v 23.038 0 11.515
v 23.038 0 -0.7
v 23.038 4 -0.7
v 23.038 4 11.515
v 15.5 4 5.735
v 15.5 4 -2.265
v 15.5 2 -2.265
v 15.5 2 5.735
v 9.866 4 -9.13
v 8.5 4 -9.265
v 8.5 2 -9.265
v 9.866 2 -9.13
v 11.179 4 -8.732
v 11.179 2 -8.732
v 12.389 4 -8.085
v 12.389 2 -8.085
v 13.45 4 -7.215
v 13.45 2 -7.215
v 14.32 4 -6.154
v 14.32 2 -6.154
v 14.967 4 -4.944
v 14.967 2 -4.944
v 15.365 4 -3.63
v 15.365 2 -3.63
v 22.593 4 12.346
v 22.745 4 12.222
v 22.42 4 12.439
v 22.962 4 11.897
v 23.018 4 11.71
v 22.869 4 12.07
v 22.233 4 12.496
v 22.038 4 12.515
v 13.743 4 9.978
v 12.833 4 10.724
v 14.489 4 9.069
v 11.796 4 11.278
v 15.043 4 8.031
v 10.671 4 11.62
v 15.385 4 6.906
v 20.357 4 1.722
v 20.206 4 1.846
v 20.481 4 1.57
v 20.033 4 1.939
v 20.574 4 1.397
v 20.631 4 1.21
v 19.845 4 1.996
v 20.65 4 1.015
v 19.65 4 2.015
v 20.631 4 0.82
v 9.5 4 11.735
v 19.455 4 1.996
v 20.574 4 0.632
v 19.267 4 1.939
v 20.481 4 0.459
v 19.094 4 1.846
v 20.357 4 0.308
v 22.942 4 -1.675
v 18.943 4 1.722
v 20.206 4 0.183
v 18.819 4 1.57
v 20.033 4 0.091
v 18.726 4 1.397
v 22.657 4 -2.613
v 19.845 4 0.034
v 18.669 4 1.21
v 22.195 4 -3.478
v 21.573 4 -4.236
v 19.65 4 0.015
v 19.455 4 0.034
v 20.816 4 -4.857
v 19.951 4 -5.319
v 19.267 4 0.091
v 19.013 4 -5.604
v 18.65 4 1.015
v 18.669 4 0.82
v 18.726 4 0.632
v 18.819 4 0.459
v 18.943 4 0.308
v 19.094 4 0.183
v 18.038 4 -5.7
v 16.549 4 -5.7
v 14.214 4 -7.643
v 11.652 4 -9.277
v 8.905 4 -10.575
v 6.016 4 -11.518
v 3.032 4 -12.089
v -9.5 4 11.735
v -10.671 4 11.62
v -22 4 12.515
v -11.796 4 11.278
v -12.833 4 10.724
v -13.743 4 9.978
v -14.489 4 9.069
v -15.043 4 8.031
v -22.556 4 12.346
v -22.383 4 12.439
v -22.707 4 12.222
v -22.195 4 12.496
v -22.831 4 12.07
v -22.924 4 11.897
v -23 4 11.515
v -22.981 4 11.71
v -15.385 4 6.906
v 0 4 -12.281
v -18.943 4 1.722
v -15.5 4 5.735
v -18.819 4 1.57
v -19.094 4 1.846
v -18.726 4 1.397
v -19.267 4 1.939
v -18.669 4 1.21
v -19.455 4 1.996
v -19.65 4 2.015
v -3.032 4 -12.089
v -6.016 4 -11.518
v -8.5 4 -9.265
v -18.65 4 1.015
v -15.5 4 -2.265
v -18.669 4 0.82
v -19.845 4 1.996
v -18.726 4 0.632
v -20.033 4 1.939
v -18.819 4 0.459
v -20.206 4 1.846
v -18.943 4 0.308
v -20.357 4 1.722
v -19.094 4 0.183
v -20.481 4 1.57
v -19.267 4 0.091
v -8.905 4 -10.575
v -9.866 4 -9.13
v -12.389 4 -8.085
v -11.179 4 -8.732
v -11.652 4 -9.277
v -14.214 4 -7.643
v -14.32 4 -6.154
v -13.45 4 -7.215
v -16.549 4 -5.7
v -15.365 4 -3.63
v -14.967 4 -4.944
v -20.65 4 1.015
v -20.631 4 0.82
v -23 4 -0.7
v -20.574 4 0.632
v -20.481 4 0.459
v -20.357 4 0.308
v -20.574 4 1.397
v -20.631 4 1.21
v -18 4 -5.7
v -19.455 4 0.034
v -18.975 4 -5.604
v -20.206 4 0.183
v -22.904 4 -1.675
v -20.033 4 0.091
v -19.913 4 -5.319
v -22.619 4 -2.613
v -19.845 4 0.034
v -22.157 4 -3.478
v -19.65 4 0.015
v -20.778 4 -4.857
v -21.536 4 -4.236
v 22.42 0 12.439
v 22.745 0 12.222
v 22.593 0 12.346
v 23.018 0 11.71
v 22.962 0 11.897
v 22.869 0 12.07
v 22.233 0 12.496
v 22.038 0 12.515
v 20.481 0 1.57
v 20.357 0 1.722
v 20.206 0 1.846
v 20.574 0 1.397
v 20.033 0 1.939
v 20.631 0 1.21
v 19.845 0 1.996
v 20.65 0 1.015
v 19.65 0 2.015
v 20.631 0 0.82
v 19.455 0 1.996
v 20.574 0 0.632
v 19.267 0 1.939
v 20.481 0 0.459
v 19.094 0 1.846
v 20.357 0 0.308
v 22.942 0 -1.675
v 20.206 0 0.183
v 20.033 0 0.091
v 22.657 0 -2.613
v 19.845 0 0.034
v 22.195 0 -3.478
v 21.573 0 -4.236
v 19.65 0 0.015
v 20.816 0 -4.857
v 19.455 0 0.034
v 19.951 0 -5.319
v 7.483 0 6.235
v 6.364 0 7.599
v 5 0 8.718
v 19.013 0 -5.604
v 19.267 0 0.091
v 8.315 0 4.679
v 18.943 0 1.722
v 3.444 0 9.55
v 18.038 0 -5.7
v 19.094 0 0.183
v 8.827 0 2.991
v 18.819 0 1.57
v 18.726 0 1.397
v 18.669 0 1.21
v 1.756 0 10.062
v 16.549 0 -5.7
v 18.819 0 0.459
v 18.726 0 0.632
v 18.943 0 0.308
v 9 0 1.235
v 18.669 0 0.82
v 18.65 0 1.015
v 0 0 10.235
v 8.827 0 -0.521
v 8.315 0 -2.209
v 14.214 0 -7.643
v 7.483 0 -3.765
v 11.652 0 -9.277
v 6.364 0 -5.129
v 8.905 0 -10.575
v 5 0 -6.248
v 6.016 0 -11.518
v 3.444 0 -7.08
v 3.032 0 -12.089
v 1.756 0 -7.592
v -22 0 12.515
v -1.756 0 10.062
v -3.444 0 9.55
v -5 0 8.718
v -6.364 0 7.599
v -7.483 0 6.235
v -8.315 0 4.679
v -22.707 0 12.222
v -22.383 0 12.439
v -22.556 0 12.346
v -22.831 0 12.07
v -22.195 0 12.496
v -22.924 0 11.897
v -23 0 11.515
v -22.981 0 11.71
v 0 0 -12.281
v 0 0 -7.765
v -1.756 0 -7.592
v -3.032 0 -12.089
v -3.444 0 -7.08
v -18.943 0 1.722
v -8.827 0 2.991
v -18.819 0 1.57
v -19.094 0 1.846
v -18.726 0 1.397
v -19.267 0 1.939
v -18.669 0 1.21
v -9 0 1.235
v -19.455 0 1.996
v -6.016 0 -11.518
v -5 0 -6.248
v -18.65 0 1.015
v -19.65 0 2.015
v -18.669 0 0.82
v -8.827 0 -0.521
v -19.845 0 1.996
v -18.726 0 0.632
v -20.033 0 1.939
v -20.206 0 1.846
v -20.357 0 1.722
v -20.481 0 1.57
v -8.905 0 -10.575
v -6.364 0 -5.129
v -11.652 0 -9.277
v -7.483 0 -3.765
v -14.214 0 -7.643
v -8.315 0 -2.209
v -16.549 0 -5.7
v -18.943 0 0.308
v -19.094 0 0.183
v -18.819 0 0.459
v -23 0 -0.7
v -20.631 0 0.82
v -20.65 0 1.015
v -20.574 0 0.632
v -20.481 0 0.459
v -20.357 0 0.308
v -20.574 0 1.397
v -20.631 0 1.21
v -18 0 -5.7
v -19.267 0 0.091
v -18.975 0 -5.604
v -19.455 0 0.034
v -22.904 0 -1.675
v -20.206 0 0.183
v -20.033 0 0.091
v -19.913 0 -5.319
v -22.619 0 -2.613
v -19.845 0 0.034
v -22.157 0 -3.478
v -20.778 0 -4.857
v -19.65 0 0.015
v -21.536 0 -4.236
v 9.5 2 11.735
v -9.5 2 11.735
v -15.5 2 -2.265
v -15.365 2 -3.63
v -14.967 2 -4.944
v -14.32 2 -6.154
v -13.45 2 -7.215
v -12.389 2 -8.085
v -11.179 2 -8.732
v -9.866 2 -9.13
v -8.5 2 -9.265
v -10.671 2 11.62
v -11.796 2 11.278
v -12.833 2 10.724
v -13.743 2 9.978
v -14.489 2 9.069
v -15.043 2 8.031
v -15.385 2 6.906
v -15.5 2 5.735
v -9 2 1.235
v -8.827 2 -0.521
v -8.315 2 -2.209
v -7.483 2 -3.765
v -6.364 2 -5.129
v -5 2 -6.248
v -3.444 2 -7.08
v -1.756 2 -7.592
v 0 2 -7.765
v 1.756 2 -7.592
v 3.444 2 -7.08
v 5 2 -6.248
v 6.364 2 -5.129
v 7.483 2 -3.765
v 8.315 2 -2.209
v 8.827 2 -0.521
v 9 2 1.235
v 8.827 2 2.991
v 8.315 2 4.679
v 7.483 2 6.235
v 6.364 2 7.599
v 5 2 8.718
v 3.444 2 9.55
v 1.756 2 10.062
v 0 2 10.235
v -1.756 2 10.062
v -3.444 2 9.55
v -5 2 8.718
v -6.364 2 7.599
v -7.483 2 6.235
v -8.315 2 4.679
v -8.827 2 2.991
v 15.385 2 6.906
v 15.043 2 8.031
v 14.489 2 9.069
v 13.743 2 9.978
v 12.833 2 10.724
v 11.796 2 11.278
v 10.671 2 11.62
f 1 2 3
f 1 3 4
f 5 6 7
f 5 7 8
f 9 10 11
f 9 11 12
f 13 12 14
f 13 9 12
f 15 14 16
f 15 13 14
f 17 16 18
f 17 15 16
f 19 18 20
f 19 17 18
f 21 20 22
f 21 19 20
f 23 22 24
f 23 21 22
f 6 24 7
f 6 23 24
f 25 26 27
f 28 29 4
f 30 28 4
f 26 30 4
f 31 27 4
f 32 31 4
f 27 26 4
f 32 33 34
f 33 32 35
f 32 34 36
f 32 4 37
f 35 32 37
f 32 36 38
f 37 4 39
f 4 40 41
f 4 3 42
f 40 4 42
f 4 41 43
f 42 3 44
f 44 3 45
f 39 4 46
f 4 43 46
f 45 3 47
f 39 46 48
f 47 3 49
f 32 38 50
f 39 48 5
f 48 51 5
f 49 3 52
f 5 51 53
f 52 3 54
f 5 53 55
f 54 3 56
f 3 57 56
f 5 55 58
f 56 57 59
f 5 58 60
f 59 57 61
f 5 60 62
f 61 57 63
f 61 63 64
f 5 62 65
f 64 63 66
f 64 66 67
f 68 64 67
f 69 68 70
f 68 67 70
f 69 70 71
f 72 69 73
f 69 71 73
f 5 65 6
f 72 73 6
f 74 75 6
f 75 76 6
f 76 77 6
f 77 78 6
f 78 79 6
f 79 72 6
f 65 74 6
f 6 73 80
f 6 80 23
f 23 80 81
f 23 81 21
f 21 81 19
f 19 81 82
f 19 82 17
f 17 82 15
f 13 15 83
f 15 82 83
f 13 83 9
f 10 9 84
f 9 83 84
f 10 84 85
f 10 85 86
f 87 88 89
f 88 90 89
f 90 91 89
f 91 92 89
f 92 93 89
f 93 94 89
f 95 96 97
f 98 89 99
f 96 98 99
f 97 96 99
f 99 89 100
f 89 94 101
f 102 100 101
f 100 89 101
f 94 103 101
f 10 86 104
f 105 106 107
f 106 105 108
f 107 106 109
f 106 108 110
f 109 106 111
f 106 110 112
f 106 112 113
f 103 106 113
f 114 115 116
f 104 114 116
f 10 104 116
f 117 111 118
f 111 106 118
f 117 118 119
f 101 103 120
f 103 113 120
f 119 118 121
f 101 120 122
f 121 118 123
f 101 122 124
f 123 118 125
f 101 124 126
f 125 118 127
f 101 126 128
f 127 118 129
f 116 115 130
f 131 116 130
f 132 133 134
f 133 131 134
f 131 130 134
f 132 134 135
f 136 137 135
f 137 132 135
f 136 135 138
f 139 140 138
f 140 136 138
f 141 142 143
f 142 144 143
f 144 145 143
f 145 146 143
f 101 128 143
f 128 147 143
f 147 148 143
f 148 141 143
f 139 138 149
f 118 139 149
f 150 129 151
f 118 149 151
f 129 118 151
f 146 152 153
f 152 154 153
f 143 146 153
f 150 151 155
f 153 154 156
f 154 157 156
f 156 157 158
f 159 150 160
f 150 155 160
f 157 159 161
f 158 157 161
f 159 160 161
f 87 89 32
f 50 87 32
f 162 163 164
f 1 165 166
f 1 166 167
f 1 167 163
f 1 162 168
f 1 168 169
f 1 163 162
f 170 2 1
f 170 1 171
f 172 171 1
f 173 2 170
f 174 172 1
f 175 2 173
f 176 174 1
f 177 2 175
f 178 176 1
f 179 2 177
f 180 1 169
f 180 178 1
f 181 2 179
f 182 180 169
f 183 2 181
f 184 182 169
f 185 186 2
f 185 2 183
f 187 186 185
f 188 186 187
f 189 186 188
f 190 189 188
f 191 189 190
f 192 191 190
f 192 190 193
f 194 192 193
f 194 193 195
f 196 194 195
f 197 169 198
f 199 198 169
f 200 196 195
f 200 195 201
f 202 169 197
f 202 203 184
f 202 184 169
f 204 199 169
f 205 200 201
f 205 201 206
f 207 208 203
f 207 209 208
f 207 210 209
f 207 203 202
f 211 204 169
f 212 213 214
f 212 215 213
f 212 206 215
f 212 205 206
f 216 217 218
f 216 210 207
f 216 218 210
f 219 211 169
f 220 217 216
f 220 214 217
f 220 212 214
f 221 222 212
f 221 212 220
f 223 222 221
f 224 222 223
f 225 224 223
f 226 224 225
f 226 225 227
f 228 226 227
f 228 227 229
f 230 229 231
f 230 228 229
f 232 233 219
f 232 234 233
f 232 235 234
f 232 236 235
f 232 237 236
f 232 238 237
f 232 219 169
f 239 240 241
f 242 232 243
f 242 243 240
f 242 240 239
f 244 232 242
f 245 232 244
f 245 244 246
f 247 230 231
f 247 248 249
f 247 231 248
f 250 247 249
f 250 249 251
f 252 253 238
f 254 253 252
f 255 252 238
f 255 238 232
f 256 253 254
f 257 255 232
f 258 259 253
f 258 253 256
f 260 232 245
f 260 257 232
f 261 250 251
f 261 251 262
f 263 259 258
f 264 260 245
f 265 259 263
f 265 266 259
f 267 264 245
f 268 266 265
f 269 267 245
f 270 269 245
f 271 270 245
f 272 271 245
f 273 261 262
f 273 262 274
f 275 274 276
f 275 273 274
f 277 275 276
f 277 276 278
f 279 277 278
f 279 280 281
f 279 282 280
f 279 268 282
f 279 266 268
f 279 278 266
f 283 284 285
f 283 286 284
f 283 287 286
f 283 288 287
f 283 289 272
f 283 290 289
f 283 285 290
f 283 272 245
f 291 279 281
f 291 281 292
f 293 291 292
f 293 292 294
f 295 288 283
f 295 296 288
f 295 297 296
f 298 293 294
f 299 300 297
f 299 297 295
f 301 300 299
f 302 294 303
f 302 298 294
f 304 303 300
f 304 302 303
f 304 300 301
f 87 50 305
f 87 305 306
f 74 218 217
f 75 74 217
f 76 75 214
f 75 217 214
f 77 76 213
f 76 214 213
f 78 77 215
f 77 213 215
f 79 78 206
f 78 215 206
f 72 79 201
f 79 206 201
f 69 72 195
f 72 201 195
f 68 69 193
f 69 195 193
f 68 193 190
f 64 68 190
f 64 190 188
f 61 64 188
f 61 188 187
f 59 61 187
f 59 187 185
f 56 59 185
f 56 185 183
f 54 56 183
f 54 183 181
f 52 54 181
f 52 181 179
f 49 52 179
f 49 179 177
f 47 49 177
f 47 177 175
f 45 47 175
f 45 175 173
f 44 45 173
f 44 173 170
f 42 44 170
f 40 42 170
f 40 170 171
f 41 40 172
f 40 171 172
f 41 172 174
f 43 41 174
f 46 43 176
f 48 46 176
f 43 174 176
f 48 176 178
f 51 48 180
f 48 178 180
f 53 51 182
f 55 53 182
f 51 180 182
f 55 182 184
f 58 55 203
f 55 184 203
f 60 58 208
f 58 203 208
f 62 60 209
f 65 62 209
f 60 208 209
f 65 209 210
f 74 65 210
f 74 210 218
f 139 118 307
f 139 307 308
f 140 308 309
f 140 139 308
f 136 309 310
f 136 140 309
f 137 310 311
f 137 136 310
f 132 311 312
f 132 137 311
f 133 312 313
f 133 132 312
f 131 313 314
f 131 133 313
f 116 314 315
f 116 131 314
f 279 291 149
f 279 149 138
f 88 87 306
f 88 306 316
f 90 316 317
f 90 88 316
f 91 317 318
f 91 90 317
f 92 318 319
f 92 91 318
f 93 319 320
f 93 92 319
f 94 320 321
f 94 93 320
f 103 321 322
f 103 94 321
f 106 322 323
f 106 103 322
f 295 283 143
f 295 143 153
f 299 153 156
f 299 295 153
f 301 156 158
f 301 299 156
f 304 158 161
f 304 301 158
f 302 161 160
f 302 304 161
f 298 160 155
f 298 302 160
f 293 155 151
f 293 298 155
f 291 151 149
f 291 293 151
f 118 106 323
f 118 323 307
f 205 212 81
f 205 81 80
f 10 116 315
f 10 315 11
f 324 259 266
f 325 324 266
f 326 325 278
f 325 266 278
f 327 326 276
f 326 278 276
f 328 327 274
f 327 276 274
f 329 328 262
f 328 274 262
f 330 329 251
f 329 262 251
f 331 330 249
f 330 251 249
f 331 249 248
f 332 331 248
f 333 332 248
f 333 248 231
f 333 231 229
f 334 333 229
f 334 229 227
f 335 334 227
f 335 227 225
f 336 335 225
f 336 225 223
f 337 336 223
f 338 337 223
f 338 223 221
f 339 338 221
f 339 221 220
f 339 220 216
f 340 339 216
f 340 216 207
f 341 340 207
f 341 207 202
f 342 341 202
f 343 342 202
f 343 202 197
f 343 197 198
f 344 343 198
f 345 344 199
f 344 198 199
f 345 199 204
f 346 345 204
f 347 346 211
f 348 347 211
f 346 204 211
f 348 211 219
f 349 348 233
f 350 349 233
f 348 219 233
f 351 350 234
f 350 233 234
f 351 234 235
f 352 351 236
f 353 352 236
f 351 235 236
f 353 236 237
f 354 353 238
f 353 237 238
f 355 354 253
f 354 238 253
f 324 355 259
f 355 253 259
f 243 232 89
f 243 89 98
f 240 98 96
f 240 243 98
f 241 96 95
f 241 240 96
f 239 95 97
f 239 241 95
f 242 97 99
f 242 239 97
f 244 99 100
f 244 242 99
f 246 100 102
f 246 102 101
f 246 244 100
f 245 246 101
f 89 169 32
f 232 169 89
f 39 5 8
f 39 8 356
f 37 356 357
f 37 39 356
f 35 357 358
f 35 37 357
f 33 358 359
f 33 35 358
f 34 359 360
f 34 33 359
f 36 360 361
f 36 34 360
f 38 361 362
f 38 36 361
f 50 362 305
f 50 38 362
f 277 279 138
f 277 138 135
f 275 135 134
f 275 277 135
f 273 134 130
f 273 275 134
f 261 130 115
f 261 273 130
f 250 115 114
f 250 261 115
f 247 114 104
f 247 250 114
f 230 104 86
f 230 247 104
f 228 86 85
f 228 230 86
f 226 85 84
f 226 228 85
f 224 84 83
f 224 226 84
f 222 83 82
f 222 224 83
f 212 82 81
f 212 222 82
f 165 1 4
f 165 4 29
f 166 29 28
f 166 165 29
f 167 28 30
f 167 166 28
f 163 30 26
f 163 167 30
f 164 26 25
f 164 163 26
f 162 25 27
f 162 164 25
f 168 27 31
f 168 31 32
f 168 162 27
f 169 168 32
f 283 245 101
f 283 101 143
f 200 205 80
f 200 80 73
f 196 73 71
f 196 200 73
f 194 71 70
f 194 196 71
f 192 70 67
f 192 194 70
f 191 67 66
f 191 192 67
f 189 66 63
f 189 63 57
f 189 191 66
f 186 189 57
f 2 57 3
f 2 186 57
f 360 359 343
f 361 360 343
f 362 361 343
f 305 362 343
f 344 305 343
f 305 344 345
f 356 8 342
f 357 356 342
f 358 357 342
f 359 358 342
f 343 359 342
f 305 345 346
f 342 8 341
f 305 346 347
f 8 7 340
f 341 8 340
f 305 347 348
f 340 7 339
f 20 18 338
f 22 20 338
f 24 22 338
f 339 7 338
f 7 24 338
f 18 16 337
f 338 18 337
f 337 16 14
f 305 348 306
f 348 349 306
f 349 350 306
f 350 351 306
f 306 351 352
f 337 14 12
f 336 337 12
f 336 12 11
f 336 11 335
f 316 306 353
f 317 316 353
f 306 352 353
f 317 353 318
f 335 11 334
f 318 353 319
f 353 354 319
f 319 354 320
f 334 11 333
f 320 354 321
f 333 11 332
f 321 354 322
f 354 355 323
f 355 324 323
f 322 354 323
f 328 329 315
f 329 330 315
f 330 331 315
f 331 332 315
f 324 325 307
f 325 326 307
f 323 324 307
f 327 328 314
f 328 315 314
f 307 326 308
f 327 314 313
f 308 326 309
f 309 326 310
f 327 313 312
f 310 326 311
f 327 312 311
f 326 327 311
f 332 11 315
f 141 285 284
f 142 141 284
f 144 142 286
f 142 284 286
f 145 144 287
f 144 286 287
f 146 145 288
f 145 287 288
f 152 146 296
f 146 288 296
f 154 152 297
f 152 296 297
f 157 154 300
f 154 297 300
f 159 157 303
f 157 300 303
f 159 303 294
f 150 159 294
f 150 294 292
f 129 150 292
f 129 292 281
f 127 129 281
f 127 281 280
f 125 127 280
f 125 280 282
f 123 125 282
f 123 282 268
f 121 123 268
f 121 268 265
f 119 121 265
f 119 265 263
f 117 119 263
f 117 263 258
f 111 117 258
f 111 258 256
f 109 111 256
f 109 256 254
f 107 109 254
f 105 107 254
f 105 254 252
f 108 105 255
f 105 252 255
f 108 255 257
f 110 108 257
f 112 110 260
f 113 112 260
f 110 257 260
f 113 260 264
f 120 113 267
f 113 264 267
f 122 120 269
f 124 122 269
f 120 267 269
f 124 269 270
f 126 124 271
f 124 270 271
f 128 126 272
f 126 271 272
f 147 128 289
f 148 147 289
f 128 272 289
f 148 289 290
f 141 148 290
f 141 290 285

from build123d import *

# Parameters (mm, degrees)
BOSS_EXTRUDE1_DEPTH       = 4
F_2_0MM_DOWEL_HOLE1_D     = 18
F_2_0MM_DOWEL_HOLE2_D     = 2
F_2_0MM_DOWEL_HOLE2_DEPTH = 10
CUT_EXTRUDE3_DEPTH        = 2


with BuildPart() as part:
    # Sketch1 → Boss-Extrude1 (new body)
    with BuildSketch(Plane(origin=(0, 0, 0), x_dir=(1, 0, 0), z_dir=(0, 1, 0))):
        with BuildLine():
            Line((16.549446177, 5.7), (18.037708346, 5.7))
            ThreePointArc((18.037708346, 5.7), (21.573242252, 4.235533906), (23.037708346, 0.7))
            Line((23.037708346, 0.7), (23.037708346, -11.514786255))
            ThreePointArc((23.037708346, -11.514786255), (22.744815127, -12.221893036), (22.037708346, -12.514786255))
            Line((22.037708346, -12.514786255), (-22, -12.514786255))
            ThreePointArc((-22, -12.514786255), (-22.707106781, -12.221893036), (-23, -11.514786255))
            Line((-23, -11.514786255), (-23, 0.7))
            ThreePointArc((-23, 0.7), (-21.535533906, 4.235533906), (-18, 5.7))
            Line((-18, 5.7), (-16.549446177, 5.7))
            ThreePointArc((-16.549446177, 5.7), (0, 12.280701177), (16.549446177, 5.7))
        make_face()
    extrude(amount=BOSS_EXTRUDE1_DEPTH)

    # Ø2.0mm Dowel Hole1 (through all)
    with Locations(Plane(origin=(0, 4, 0), x_dir=(1, 0, 0), z_dir=(0, 1, 0))):
        with Locations((0, -1.235213745)):
            Hole(F_2_0MM_DOWEL_HOLE1_D / 2)

    # Ø2.0mm Dowel Hole2
    with Locations(Plane(origin=(0, 4, 0), x_dir=(1, 0, 0), z_dir=(0, 1, 0))):
        with Locations((-19.65, -1.014786255), (19.65, -1.014786255)):
            Hole(F_2_0MM_DOWEL_HOLE2_D / 2, depth=F_2_0MM_DOWEL_HOLE2_DEPTH)

    # Sketch9 → Cut-Extrude3 (cut)
    with BuildSketch(Plane(origin=(0, 4, 0), x_dir=(1, 0, 0), z_dir=(0, 1, 0))):
        with BuildLine():
            Line((-8.5, 9.264786255), (8.5, 9.264786255))
            ThreePointArc((8.5, 9.264786255), (13.449747468, 7.214533723), (15.5, 2.264786255))
            Line((15.5, 2.264786255), (15.5, -5.735213745))
            ThreePointArc((15.5, -5.735213745), (13.742640687, -9.977854433), (9.5, -11.735213745))
            Line((9.5, -11.735213745), (-9.5, -11.735213745))
            ThreePointArc((-9.5, -11.735213745), (-13.742640687, -9.977854433), (-15.5, -5.735213745))
            Line((-15.5, -5.735213745), (-15.5, 2.264786255))
            ThreePointArc((-15.5, 2.264786255), (-13.449747468, 7.214533723), (-8.5, 9.264786255))
        make_face()
    extrude(amount=-CUT_EXTRUDE3_DEPTH, mode=Mode.SUBTRACT)


solid = part.part
